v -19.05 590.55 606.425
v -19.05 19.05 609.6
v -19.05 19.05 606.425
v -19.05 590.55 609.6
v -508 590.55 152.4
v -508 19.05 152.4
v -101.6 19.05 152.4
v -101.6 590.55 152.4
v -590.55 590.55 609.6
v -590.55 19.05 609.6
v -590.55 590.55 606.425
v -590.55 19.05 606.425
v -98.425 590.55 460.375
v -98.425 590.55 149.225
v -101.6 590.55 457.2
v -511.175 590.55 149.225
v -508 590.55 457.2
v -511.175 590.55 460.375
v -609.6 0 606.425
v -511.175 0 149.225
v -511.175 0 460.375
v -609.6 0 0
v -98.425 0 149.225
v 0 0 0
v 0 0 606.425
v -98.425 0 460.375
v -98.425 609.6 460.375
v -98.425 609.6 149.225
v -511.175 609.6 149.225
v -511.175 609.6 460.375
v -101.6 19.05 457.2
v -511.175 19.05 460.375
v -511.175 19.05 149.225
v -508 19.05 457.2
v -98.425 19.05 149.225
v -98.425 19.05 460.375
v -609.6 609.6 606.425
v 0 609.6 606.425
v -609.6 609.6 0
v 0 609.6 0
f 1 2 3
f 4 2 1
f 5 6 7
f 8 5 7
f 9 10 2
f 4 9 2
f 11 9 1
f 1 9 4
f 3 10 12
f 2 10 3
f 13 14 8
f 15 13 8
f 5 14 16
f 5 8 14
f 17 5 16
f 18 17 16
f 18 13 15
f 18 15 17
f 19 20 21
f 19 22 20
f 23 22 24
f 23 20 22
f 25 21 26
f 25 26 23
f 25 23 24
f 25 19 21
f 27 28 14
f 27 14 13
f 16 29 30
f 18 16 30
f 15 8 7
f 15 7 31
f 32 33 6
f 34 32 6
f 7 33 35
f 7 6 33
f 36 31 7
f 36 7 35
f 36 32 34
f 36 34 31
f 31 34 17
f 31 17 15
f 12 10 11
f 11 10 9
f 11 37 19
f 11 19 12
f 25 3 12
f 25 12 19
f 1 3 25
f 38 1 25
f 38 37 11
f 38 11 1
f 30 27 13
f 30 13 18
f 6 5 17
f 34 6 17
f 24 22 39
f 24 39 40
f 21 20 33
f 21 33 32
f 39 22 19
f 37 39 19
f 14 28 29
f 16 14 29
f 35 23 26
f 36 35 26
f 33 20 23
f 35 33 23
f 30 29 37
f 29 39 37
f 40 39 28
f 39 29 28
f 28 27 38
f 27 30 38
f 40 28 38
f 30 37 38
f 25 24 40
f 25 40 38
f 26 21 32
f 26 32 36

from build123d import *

# Parameters (mm, degrees)
F0_W     = 609.6
F0_H     = 609.6
F0_W_2   = 406.4
F0_H_2   = 304.8
F1_DEPTH = 609.6
F2_W     = 609.6
F2_H     = 609.6
F2_W_2   = 571.5
F2_H_2   = 571.5
F3_DEPTH = 3.175
F4_W     = 412.75
F4_H     = 311.15
F4_W_2   = 406.4
F4_H_2   = 304.8
F5_DEPTH = 19.05
F6_W     = 412.75
F6_H     = 311.15
F6_W_2   = 406.4
F6_H_2   = 304.8
F7_DEPTH = 19.05


with BuildPart() as f1:
    # F0 (on Front) → F1 (new body)
    with BuildSketch(Plane.XZ):
        with Locations((-304.8, 304.8)):
            Rectangle(F0_W, F0_H)
        with Locations((-304.8, 304.8)):
            Rectangle(F0_W_2, F0_H_2, mode=Mode.SUBTRACT)
    extrude(amount=-F1_DEPTH)

    # F2 (on face) → F3 (cut)
    with BuildSketch(Plane.XY.offset(609.6)):
        with Locations((-304.8, 304.8)):
            Rectangle(F2_W, F2_H)
        with Locations((-304.8, 304.8)):
            Rectangle(F2_W_2, F2_H_2, mode=Mode.SUBTRACT)
    extrude(amount=-F3_DEPTH, mode=Mode.SUBTRACT)

    # F4 (on face) → F5 (cut)
    with BuildSketch(Plane.XZ):
        with Locations((-304.8, 304.8)):
            Rectangle(F4_W, F4_H)
        with Locations((-304.8, 304.8)):
            Rectangle(F4_W_2, F4_H_2, mode=Mode.SUBTRACT)
    extrude(amount=-F5_DEPTH, mode=Mode.SUBTRACT)

    # F6 (on face) → F7 (cut)
    with BuildSketch(Plane(origin=(0, 609.6, 0), x_dir=(-1, 0, 0), z_dir=(0, 1, 0))):
        with Locations((304.8, 304.8)):
            Rectangle(F6_W, F6_H)
        with Locations((304.8, 304.8)):
            Rectangle(F6_W_2, F6_H_2, mode=Mode.SUBTRACT)
    extrude(amount=-F7_DEPTH, mode=Mode.SUBTRACT)


solid = f1.part
